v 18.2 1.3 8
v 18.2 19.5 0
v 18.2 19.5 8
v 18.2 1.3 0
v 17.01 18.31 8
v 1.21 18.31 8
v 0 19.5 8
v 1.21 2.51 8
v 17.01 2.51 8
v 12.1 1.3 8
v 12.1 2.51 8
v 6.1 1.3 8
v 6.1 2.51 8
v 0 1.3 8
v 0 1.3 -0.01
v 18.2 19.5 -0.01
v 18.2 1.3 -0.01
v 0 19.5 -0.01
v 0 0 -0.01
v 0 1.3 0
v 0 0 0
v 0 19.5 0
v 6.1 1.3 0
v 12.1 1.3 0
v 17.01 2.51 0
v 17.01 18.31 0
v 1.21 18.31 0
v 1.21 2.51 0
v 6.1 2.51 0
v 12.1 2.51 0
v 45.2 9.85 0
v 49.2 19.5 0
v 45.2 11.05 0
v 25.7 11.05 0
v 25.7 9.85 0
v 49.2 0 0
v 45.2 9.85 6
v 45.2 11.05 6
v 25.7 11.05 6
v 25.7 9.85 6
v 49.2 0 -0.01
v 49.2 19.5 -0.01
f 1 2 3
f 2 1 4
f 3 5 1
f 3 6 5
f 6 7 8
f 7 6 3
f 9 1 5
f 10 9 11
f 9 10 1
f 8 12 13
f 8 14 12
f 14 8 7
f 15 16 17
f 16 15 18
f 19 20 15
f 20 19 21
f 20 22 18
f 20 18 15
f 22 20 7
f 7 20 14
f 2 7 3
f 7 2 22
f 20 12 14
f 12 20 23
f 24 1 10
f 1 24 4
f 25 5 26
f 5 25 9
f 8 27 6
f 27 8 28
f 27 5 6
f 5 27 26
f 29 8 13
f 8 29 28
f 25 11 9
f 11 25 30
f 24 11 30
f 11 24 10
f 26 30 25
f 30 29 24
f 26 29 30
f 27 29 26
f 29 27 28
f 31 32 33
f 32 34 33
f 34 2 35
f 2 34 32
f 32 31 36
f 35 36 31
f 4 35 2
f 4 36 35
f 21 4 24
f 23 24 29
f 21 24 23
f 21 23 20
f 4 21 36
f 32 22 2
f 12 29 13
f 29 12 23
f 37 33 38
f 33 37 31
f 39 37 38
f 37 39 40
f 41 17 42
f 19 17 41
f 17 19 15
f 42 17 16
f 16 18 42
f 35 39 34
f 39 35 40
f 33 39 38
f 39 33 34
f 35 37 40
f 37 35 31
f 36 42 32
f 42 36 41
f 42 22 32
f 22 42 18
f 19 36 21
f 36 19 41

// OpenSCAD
// file: ../Base/PlacementOptions.scad
// Fischertechnik Box Foundation
// Placement Options

// Alignment
NoAlign = 0;
AlignLeft = 1;
AlignBottom = 2;
AlignCenter = 3;
AlignRight = 4;
AlignTop = 5;

// Element rotation degree steps
rotations = [0, -90, -180, -270];

// Rotation
NoRotation = 0;
Rotate0 = 0;
Rotate90 = 1;
Rotate180 = 2;
Rotate270 = 3;

// Docking (seen from above)
NoDock = -1;
DockLeft = 0;
DockTop = 1;
DockRight = 2;
DockCorner = 2;
DockBottom = 3;

// Web corners
LowerLeft = 0;
UpperLeft = 1;
UpperRight = 2;
LowerRight = 3;

// Web position relative to corner
LeftOfCorner = 0;
RightOfCorner = 1;

// Rails direction
Horizontal = true;
Vertical = false;
// file: ../Base/Boxes.scad
// Fischertechnik Box Foundation
// Pre-designed Boxes

use <Constants.scad>

include <PlacementOptions.scad>

box190Width = 190;
box190Depth = 130;
box130Width = 130;
box130Depth = 95;

// Values are from an original ec3 box
topBottomDifference = 1.5;
outerHeight = 40;
baseThickness = 1.8;
innerHeight = outerHeight - baseThickness;
stackExcess = 5.7;
radius = 3.5;
wallThickness = 1.5;
tolerance = 0.2;

boxWallThickness = wallThickness;
boxBaseThickness = baseThickness;
boxWebWidth = 3.0;

// getBoxWallThickness()
// Gets the wall thickness of a Fischertechnik Box
function getBoxWallThickness() = boxWallThickness;

// getBoxUsageHeight(height = 38.2)
// Gets the usable height of a Fischertechnik box
// height = Outer height of the box from the bottom to the upper edge.
function getBoxUsageHeight(height = outerHeight) = height - baseThickness - stackExcess;

// getBoxInnerHeight()
// Gets the inner height of a Fischertechnik box, including the stack excess
function getBoxInnerHeight() = innerHeight;

// getBoxBaseThickness()
// Gets the thickness of the Fischertechnik box base.
function getBoxBaseThickness() = boxBaseThickness;

// getBoxWebWidth()
// Gets the width of a box web
function getBoxWebWidth() = boxWebWidth;

// getBox190Space()
// Gets the usable inner space of a Box 190 as an x/y-list
function getBox190Space() = [
    box190Width - 2*getBoxWallThickness() - topBottomDifference, 
    box190Depth - 2*getBoxWallThickness() - topBottomDifference ];

// RoundedCornerPlate(width, depth, height, radius)
// Creates a body plate with rounded corners for a box. Used
// also to create the complete box with the hull module.
// width = Width of the plate
// depth = depth of the plate 
// height = thickness of the plate
// radius = radius of the rounded corner
module RoundedCornerPlate(width, depth, height, radius) {
    translate([radius, radius])
    hull() {
        w = width-2*radius;
        d = depth-2*radius;
        cube([w, d, height]);
        cylinder(height, r=radius, $fn=getFragments());
        translate([w, 0])
            cylinder(height, r=radius, $fn=getFragments());
        translate([w, d])
            cylinder(height, r=radius, $fn=getFragments());
        translate([0, d])
            cylinder(height, r=radius, $fn=getFragments());
    }
}

// BoxBase(width, depth)
// Creates an empty stackable Fischertechnik compatible box
// width = Outer width of the box (190, 130, ...)
// depth = Outer depth of the box (130, 95, ...)

module BoxBase(width, depth, height=outerHeight) {    
    thinPlate = 0.01;

    innerHeight = height - baseThickness;    
    
    module Body(tolerance=tolerance) {
        hull() {
            // Bottom with tolerance to fit into the original boxes when stacked
            translate([-wallThickness+tolerance, -wallThickness+tolerance, -baseThickness])
                RoundedCornerPlate(width-topBottomDifference-2*tolerance, depth-topBottomDifference-2*tolerance, thinPlate, radius);
            
            // Top
            translate([-wallThickness-topBottomDifference/2, -wallThickness-topBottomDifference/2, innerHeight-thinPlate])
                RoundedCornerPlate(width, depth, thinPlate, radius);
         }
    }

    module Cutoff() {
        hull() {
            coWidth = width - 2*wallThickness;
            coDepth = depth - 2*wallThickness;
            
            // Bottom
            RoundedCornerPlate(coWidth-topBottomDifference, coDepth-topBottomDifference, thinPlate, radius);

            // Top
            translate([-topBottomDifference/2, -topBottomDifference/2, innerHeight+thinPlate]) 
                RoundedCornerPlate(coWidth, coDepth, thinPlate, radius);
        }
    }
    
    difference() {        
        Body();
        Cutoff();
        stackOffset = innerHeight - stackExcess;
        translate([0, 0, stackOffset + baseThickness])
            Body(tolerance=0);
    }
}

// Creates the Fischertechnik empty box 130x190 mm and places it at position 0,0
// 190x130 are the outer sizes, the inner space is slightly smaller. Use getBox190Space() to get the inner sizes.
// The box is positioned that the usable inner space is at the 0,0,0 position.

module Box190() {
    BoxBase(box190Width, box190Depth);
}

// Gets the usable inner space of a Box 130 as an x/y-list
function getBox130Space() = [
    box130Width - 2*getBoxWallThickness() - topBottomDifference, 
    box130Depth - 2*getBoxWallThickness() - topBottomDifference ];

// Creates the Fischertechnik empty box 95x130 mm and places it at position 0,0
// 190x130 are the outer sizes, the inner space is slightly smaller. Use getBox190Space() to get the inner sizes.
// The box is positioned that the usable inner space is at the 0,0,0 position.

module Box130() {
    BoxBase(box130Width, box130Depth);
}

// Creates a web at the specified box walls
// corner 0 = LowerLeft, 1 = UpperLeft, 2 = UpperRight, 3 = LowerRight
// side 0 = LeftOfCorner, 1 = RightOfCorner
// distance = Distance in mm from the corner
// boxSpace = inner width and depth of the box (default: Box 190)
// webWidth = length of the web (default is 3 mms)
// webThickness = thickness of the web (default is 1 mm)
// height = Height of the web (standard is getBoxUsageHeight())
// sink = How much of the web is sunk into the wall

module BoxWeb(
    corner, 
    side, 
    distance, 
    boxSpace=getBox190Space(), 
    webWidth=getBoxWebWidth(), 
    webThickness=1.0, 
    height=getBoxUsageHeight(),
    sink = getBoxWallThickness()/2) {
    width = (corner % 2 == 0) ? 
            (side == LeftOfCorner ? webWidth : webThickness) :
            (side == LeftOfCorner ? webThickness : webWidth);

    depth = (corner % 2 == 0) ? 
            (side == RightOfCorner ? webWidth : webThickness) :
            (side == RightOfCorner ? webThickness : webWidth);
    
    xDiff = corner == LowerLeft ? 
                (side == LeftOfCorner ? -sink : distance) :
            (corner == UpperLeft ?                
                (side == LeftOfCorner ? distance : -sink) :
            (corner == UpperRight ?
                (side == LeftOfCorner ? boxSpace.x-webWidth+sink : boxSpace.x-distance-webThickness) :
                (side == LeftOfCorner ? boxSpace.x-distance-webThickness: boxSpace.x-webWidth+sink)));

    yDiff = corner == LowerLeft ? 
                (side == RightOfCorner ? -sink : distance) :
            (corner == UpperLeft ?
                (side == RightOfCorner ? boxSpace.y-distance-webThickness : boxSpace.y-webWidth+sink) :
            (corner == UpperRight ?
                (side == RightOfCorner ? boxSpace.y-webWidth+sink : boxSpace.y-distance-webThickness) :
                (side == RightOfCorner ? distance : -sink)));
    
    translate([xDiff, yDiff, -getExcess()])
        cube([width, depth, height + 2*getExcess()]);
}
// file: ../Base/Rotation.scad
// Fischertechnik Box Foundation
// Geometry Helpers Rotation

include <PlacementOptions.scad>

// getRotatedSpace(space, rotation=NoRotation)
// Rotates the space dependent on the specified rotation

function getRotatedSpace(space, rotation=NoRotation) = [
    (rotation == Rotate90 || rotation == Rotate270) ? space.y : space.x,
    (rotation == Rotate90 || rotation == Rotate270) ? space.x : space.y
];

// Rotates the given space around the fixed left lower corner
// space = the space the children needs as width/depth list [width,depth]
// rotation = 0 Rotate0 degrees, 1 Rotate90 degrees, 2 Rotate180 degrees, 3 Rotate270 degrees (equivalent to -90)

module RotateFix(space, rotation=NoRotation) {
    dy = (rotation == Rotate0 || rotation == Rotate270) ? 0 :
        (rotation == Rotate90) ? space.x :
        space.y;
    dx = (rotation < Rotate180) ? 0 :
        (rotation == Rotate180) ? space.x :
        space.y;
    
    translate([dx, dy, 0])
        rotate([0, 0, rotations[rotation]])
            children();
}
// file: ../Base/Alignment.scad
// Fischertechnik Box Foundation
// Geometry Helpers Alignment

include <PlacementOptions.scad>

// getAlignedX(elementWidth, spaceWidth, align=AlignRight, offset=0)
// Gets the aligned X offset of an element with the given
// width in the given space.
// elementWidth = The width of the element to positon
// spaceWidth = The space where the element should be aligned
// align = 0 AlignLeft, 1 AlignCenter, 2 AlignRight
// offset = an optional offset from the aligned position. When
// aligned left or centered, then positive values are in X direction.
// When aligned right then positive values are in negative X direction.

function getAlignedX(elementWidth, spaceWidth, align=AlignRight, offset=0) =
    (align == AlignLeft) ?
        offset :
        ((align == AlignCenter) ?
        (spaceWidth - elementWidth)/2 + offset :
        spaceWidth - offset - elementWidth);

// getAlignedY(elementDepth, spaceDepth, align=AlignTop, offset=0)
// Gets the aligned Y offset of an element with the given
// depth in the given space.
// elementDepth = The depth of the element to positon
// spaceDepth = The space where the element should be aligned
// align = 0 AlignBottom, 1 AlignCenter, 2 AlignTop
// offset = an optional offset from the aligned position. When
// aligned bottom or centered, then positive values are in Y direction.
// When aligned top then positive values are in negative Y direction.

function getAlignedY(elementDepth, spaceDepth, align=AlignTop, offset=0) =
    (align == AlignBottom) ?
        offset :
        ((align == AlignCenter) ?
        (spaceDepth - elementDepth)/2 + offset :
        spaceDepth - offset - elementDepth);
// file: ../Base/Placement.scad
// Fischertechnik Box Foundation
// Geometry Helpers Placement

use <Constants.scad>
use <Alignment.scad>
use <Rotation.scad>
use <Boxes.scad>

include <PlacementOptions.scad>

// Place(x=0, y=0, elementSpace=[0,0], alignX=AlignLeft, alignY=AlignBottom, rotation=Rotate0, boxSpace=getBox190Space())
// Places the child at the specified position
// y = Y-Position. This is a relative position when an X aligment is specified.
// x = X-Position. This is a relative position when an Y aligment is specified.
// elementSpace = space of the element to be placed [x,y]
// alignX = -1=NoAlign, 0 AlignLeft, 1 AlignCenter, 3 AlignRight (elementSpace and boxSpace required!)
// alignY = -1=NoAlign, 2 AlignBottom, 1 AlignCenter, 4 AlignTop (elementSpace and boxSpace required!)
// rotation = 0 Rotate0 0 degrees, 1 Rotate90 90 degrees, 
// 2 Rotate180 180 degrees, 3 Rotate270 270 degrees (equivalent to -90)
// boxSpace = Inner space of the box where the placement occurs [x,y] - default is Box 190x130 inner space

module Place(x=0, y=0, elementSpace=[0,0], 
  alignX=AlignLeft, alignY=AlignBottom, 
  rotation=NoRotation, boxSpace=getBox190Space()) {

    module Position(x, y, space, rotation=Rotate0) {
        translate([x, y, 0])
            RotateFix(space, rotation)
                children();
    }

    space = getRotatedSpace(elementSpace, rotation);
    alignedX = getAlignedX(space.x, boxSpace.x, alignX, x);
    alignedY = getAlignedY(space.y, boxSpace.y, alignY, y);
    Position(alignedX, alignedY, elementSpace, rotation)
        children();
}

// Center(space=getBox130Space(), elementSpace=[0,0])
// space = Space where the children is centered. For cylinder use centered=true and no elementSpace.
// elementSpace = space of the element to be centered [x,y]

module Center(space=getBox190Space(), elementSpace=[0,0]) {
    Place(elementSpace=elementSpace, boxSpace=space, alignX=AlignCenter, alignY=AlignCenter)
        children();
}

// CenterHorizontal(width=0, y=0, offset=0, space=getBox130Space())
// width = Width of the element to be placed.
// y = Y position of the element
// offset = Offset from the center position (negative will be left of the center)
// space = Space where the element is placed

module CenterHorizontal(width=0, y=0, offset=0, space=getBox190Space()) {
    Place(x=offset, y=y, elementSpace=[width, 0], boxSpace=space, alignX=AlignCenter)
        children(0);
}

// CenterVertical(depth=0, x=0, offset=0, space=getBox130Space())
// depth = Depth of the element to be placed.
// x = X position of the element
// offset = Offset from the center position (negative will be down of the center)
// space = Space where the element is placed

module CenterVertical(depth=0, x=0, offset=0, space=getBox190Space()) {
    Place(x=x, y=offset, elementSpace=[0, depth], boxSpace=space, alignY=AlignCenter)
        children(0);
}

// getIsVertical(align)
// True if the specified alignment needs a vertical orientation for a divider (AlignRight, AlignLeft)

function getIsVertical(align) = (align == AlignRight || align == AlignLeft);

// getIsHorizontal(align)
// True if the specified alignment needs a horizontal orientation for a divider (AlignTop, AlignBottom)

function getIsHorizontal(align) = (align == AlignTop || align == AlignBottom);
// file: ../Base/Constants.scad
// Fischertechnik Box Foundation
// Constants

// Constant values necessary for multiple elements

// Base constants
dividerThickness = 1.2;
excess = 0.01;
fragments = 90;
tolerance = 0.8;

// Gets the thickness of a divider 
function getDividerThickness() = dividerThickness;

// Gets the excess that is used to merge walls into each other
function getExcess() = excess;

// Gets amount of fragments of a cylinder
function getFragments() = fragments;

// Gets the inner tolerance of a frame to each side
function getTolerance() = tolerance;


// Fischertechnik specific constants
axisDiameter = 4;
axisBottomDiameter = axisDiameter + 1;
axisTolerance = 0.2;
axisLockingLength = 8;

// Gets axis diameter of Fischertechnik axis
function getAxisDiameter() = axisDiameter;

// Gets axis diameter tolerance (subtracted for element axis)
function getAxisTolerance() = axisTolerance;

// Gets the axis diameter for standing axis
function getStandAxisDiameter() = getAxisDiameter() - getAxisTolerance();

// Gets axis bottom diameter for thicker part at the bottom
function getAxisBottomDiameter() = axisBottomDiameter;

// Gets the lengthh of the locking part of a locking axis
function getAxisLockingLength() = axisLockingLength;

// Studs

studHeight = 2.5;
studTolerance = 0.2;

// gets the height of a connecting stud
function getStudHeight() = studHeight;

// gets the connecting stud height tolerance
function getStudTolerance() = studTolerance;

// Dockable Frame with Edge

standardEdgeDistance = 2.5;
standardWebDistance = 11.5;
standardCornerLength = 15;

// gets the standard distance to the wall of the box for dockable frames with webs
function getStandardEdgeDistance() = standardEdgeDistance;

// gets the standard distance of each web to the corner of the dockable frame
function getStandardWebDistance() = standardWebDistance;

// gets the standard length of the corner walls of a dockable frame
function getStandardCornerLength() = standardCornerLength;

// Tubes

tubeWallFactor = 0.8;

// gets the wall thickness of a tube.
function getTubeWallThickness() = tubeWallFactor * getDividerThickness();

// Small Parts and Divider Frame

smallPartsFrameHeight = 20;

// gets the frame height for docked small parts boxes.
function getSmallPartsFrameHeight() = smallPartsFrameHeight;

// Hubs

hubRingDiameter = 19.5;
hubRingLevelDiameter = 21;

// gets the diameter of a tube matching the inner ring of a wheel
function getHubRingDiameter() = hubRingDiameter;

// gets the diameter of a hub tube with a thicker diameter
function getHubRingLevelDiameter() = hubRingLevelDiameter;

// Struts

strutAddLength = 9.0;
strutDepth = 8.0;

// gets the full length of a strut
function getFullStrutLength(length) = length + strutAddLength;

// gets the radius of the end of a strut
function getStrutEndRadius() = strutAddLength / 2;

// gets the the depth of a strut
function getStrutDepth() = strutDepth;
// main file
// Fischertechnik Box Library
// Frame for gear block with worm m 1.5 mm for mini-motor
// 31066

use <../Base/Constants.scad>
use <../Base/Placement.scad>
use <../ModelBase/Simple.scad>

/* [Hidden] */
width = 46;
depth = 15;
height = 8;
offset = getStudHeight() - getDividerThickness();

// getFrameGearBlockWithWormSpace()
// Gets the space of a frame for a gear block (mini-mot 1)

function getFrameGearBlockWithWormSpace() = getFrameOuterVolume([width, depth + offset, height]);

// FrameGearBlockWithWorm()
// frame for a gear block with worm m 1.5 mm for mini-motor

module FrameGearBlockWithWorm() {
    Space(getFrameGearBlockWithWormSpace());
    blockWidth = 15;
    volume = [blockWidth, depth, height];

    cutoffWidth = 6;
    translate([0, offset]) {
        difference() {
            Frame(volume);
            FrameBottomCutoff(volume, cutoffWidth);
        }
        wallWidth = 19.5;
        wallHeight = 6;
        wallVolume = [wallWidth, getDividerThickness(), wallHeight];
        wallXOffset = getFrameOuterVolume(volume).x + 7.5;
        CenterVertical(wallVolume.y, x=wallXOffset, offset=-getDividerThickness()/2, space=getFrameGearBlockWithWormSpace())
            Wall(wallVolume);
    }
}

// Tests
color("lightgray")
FrameGearBlockWithWorm();
